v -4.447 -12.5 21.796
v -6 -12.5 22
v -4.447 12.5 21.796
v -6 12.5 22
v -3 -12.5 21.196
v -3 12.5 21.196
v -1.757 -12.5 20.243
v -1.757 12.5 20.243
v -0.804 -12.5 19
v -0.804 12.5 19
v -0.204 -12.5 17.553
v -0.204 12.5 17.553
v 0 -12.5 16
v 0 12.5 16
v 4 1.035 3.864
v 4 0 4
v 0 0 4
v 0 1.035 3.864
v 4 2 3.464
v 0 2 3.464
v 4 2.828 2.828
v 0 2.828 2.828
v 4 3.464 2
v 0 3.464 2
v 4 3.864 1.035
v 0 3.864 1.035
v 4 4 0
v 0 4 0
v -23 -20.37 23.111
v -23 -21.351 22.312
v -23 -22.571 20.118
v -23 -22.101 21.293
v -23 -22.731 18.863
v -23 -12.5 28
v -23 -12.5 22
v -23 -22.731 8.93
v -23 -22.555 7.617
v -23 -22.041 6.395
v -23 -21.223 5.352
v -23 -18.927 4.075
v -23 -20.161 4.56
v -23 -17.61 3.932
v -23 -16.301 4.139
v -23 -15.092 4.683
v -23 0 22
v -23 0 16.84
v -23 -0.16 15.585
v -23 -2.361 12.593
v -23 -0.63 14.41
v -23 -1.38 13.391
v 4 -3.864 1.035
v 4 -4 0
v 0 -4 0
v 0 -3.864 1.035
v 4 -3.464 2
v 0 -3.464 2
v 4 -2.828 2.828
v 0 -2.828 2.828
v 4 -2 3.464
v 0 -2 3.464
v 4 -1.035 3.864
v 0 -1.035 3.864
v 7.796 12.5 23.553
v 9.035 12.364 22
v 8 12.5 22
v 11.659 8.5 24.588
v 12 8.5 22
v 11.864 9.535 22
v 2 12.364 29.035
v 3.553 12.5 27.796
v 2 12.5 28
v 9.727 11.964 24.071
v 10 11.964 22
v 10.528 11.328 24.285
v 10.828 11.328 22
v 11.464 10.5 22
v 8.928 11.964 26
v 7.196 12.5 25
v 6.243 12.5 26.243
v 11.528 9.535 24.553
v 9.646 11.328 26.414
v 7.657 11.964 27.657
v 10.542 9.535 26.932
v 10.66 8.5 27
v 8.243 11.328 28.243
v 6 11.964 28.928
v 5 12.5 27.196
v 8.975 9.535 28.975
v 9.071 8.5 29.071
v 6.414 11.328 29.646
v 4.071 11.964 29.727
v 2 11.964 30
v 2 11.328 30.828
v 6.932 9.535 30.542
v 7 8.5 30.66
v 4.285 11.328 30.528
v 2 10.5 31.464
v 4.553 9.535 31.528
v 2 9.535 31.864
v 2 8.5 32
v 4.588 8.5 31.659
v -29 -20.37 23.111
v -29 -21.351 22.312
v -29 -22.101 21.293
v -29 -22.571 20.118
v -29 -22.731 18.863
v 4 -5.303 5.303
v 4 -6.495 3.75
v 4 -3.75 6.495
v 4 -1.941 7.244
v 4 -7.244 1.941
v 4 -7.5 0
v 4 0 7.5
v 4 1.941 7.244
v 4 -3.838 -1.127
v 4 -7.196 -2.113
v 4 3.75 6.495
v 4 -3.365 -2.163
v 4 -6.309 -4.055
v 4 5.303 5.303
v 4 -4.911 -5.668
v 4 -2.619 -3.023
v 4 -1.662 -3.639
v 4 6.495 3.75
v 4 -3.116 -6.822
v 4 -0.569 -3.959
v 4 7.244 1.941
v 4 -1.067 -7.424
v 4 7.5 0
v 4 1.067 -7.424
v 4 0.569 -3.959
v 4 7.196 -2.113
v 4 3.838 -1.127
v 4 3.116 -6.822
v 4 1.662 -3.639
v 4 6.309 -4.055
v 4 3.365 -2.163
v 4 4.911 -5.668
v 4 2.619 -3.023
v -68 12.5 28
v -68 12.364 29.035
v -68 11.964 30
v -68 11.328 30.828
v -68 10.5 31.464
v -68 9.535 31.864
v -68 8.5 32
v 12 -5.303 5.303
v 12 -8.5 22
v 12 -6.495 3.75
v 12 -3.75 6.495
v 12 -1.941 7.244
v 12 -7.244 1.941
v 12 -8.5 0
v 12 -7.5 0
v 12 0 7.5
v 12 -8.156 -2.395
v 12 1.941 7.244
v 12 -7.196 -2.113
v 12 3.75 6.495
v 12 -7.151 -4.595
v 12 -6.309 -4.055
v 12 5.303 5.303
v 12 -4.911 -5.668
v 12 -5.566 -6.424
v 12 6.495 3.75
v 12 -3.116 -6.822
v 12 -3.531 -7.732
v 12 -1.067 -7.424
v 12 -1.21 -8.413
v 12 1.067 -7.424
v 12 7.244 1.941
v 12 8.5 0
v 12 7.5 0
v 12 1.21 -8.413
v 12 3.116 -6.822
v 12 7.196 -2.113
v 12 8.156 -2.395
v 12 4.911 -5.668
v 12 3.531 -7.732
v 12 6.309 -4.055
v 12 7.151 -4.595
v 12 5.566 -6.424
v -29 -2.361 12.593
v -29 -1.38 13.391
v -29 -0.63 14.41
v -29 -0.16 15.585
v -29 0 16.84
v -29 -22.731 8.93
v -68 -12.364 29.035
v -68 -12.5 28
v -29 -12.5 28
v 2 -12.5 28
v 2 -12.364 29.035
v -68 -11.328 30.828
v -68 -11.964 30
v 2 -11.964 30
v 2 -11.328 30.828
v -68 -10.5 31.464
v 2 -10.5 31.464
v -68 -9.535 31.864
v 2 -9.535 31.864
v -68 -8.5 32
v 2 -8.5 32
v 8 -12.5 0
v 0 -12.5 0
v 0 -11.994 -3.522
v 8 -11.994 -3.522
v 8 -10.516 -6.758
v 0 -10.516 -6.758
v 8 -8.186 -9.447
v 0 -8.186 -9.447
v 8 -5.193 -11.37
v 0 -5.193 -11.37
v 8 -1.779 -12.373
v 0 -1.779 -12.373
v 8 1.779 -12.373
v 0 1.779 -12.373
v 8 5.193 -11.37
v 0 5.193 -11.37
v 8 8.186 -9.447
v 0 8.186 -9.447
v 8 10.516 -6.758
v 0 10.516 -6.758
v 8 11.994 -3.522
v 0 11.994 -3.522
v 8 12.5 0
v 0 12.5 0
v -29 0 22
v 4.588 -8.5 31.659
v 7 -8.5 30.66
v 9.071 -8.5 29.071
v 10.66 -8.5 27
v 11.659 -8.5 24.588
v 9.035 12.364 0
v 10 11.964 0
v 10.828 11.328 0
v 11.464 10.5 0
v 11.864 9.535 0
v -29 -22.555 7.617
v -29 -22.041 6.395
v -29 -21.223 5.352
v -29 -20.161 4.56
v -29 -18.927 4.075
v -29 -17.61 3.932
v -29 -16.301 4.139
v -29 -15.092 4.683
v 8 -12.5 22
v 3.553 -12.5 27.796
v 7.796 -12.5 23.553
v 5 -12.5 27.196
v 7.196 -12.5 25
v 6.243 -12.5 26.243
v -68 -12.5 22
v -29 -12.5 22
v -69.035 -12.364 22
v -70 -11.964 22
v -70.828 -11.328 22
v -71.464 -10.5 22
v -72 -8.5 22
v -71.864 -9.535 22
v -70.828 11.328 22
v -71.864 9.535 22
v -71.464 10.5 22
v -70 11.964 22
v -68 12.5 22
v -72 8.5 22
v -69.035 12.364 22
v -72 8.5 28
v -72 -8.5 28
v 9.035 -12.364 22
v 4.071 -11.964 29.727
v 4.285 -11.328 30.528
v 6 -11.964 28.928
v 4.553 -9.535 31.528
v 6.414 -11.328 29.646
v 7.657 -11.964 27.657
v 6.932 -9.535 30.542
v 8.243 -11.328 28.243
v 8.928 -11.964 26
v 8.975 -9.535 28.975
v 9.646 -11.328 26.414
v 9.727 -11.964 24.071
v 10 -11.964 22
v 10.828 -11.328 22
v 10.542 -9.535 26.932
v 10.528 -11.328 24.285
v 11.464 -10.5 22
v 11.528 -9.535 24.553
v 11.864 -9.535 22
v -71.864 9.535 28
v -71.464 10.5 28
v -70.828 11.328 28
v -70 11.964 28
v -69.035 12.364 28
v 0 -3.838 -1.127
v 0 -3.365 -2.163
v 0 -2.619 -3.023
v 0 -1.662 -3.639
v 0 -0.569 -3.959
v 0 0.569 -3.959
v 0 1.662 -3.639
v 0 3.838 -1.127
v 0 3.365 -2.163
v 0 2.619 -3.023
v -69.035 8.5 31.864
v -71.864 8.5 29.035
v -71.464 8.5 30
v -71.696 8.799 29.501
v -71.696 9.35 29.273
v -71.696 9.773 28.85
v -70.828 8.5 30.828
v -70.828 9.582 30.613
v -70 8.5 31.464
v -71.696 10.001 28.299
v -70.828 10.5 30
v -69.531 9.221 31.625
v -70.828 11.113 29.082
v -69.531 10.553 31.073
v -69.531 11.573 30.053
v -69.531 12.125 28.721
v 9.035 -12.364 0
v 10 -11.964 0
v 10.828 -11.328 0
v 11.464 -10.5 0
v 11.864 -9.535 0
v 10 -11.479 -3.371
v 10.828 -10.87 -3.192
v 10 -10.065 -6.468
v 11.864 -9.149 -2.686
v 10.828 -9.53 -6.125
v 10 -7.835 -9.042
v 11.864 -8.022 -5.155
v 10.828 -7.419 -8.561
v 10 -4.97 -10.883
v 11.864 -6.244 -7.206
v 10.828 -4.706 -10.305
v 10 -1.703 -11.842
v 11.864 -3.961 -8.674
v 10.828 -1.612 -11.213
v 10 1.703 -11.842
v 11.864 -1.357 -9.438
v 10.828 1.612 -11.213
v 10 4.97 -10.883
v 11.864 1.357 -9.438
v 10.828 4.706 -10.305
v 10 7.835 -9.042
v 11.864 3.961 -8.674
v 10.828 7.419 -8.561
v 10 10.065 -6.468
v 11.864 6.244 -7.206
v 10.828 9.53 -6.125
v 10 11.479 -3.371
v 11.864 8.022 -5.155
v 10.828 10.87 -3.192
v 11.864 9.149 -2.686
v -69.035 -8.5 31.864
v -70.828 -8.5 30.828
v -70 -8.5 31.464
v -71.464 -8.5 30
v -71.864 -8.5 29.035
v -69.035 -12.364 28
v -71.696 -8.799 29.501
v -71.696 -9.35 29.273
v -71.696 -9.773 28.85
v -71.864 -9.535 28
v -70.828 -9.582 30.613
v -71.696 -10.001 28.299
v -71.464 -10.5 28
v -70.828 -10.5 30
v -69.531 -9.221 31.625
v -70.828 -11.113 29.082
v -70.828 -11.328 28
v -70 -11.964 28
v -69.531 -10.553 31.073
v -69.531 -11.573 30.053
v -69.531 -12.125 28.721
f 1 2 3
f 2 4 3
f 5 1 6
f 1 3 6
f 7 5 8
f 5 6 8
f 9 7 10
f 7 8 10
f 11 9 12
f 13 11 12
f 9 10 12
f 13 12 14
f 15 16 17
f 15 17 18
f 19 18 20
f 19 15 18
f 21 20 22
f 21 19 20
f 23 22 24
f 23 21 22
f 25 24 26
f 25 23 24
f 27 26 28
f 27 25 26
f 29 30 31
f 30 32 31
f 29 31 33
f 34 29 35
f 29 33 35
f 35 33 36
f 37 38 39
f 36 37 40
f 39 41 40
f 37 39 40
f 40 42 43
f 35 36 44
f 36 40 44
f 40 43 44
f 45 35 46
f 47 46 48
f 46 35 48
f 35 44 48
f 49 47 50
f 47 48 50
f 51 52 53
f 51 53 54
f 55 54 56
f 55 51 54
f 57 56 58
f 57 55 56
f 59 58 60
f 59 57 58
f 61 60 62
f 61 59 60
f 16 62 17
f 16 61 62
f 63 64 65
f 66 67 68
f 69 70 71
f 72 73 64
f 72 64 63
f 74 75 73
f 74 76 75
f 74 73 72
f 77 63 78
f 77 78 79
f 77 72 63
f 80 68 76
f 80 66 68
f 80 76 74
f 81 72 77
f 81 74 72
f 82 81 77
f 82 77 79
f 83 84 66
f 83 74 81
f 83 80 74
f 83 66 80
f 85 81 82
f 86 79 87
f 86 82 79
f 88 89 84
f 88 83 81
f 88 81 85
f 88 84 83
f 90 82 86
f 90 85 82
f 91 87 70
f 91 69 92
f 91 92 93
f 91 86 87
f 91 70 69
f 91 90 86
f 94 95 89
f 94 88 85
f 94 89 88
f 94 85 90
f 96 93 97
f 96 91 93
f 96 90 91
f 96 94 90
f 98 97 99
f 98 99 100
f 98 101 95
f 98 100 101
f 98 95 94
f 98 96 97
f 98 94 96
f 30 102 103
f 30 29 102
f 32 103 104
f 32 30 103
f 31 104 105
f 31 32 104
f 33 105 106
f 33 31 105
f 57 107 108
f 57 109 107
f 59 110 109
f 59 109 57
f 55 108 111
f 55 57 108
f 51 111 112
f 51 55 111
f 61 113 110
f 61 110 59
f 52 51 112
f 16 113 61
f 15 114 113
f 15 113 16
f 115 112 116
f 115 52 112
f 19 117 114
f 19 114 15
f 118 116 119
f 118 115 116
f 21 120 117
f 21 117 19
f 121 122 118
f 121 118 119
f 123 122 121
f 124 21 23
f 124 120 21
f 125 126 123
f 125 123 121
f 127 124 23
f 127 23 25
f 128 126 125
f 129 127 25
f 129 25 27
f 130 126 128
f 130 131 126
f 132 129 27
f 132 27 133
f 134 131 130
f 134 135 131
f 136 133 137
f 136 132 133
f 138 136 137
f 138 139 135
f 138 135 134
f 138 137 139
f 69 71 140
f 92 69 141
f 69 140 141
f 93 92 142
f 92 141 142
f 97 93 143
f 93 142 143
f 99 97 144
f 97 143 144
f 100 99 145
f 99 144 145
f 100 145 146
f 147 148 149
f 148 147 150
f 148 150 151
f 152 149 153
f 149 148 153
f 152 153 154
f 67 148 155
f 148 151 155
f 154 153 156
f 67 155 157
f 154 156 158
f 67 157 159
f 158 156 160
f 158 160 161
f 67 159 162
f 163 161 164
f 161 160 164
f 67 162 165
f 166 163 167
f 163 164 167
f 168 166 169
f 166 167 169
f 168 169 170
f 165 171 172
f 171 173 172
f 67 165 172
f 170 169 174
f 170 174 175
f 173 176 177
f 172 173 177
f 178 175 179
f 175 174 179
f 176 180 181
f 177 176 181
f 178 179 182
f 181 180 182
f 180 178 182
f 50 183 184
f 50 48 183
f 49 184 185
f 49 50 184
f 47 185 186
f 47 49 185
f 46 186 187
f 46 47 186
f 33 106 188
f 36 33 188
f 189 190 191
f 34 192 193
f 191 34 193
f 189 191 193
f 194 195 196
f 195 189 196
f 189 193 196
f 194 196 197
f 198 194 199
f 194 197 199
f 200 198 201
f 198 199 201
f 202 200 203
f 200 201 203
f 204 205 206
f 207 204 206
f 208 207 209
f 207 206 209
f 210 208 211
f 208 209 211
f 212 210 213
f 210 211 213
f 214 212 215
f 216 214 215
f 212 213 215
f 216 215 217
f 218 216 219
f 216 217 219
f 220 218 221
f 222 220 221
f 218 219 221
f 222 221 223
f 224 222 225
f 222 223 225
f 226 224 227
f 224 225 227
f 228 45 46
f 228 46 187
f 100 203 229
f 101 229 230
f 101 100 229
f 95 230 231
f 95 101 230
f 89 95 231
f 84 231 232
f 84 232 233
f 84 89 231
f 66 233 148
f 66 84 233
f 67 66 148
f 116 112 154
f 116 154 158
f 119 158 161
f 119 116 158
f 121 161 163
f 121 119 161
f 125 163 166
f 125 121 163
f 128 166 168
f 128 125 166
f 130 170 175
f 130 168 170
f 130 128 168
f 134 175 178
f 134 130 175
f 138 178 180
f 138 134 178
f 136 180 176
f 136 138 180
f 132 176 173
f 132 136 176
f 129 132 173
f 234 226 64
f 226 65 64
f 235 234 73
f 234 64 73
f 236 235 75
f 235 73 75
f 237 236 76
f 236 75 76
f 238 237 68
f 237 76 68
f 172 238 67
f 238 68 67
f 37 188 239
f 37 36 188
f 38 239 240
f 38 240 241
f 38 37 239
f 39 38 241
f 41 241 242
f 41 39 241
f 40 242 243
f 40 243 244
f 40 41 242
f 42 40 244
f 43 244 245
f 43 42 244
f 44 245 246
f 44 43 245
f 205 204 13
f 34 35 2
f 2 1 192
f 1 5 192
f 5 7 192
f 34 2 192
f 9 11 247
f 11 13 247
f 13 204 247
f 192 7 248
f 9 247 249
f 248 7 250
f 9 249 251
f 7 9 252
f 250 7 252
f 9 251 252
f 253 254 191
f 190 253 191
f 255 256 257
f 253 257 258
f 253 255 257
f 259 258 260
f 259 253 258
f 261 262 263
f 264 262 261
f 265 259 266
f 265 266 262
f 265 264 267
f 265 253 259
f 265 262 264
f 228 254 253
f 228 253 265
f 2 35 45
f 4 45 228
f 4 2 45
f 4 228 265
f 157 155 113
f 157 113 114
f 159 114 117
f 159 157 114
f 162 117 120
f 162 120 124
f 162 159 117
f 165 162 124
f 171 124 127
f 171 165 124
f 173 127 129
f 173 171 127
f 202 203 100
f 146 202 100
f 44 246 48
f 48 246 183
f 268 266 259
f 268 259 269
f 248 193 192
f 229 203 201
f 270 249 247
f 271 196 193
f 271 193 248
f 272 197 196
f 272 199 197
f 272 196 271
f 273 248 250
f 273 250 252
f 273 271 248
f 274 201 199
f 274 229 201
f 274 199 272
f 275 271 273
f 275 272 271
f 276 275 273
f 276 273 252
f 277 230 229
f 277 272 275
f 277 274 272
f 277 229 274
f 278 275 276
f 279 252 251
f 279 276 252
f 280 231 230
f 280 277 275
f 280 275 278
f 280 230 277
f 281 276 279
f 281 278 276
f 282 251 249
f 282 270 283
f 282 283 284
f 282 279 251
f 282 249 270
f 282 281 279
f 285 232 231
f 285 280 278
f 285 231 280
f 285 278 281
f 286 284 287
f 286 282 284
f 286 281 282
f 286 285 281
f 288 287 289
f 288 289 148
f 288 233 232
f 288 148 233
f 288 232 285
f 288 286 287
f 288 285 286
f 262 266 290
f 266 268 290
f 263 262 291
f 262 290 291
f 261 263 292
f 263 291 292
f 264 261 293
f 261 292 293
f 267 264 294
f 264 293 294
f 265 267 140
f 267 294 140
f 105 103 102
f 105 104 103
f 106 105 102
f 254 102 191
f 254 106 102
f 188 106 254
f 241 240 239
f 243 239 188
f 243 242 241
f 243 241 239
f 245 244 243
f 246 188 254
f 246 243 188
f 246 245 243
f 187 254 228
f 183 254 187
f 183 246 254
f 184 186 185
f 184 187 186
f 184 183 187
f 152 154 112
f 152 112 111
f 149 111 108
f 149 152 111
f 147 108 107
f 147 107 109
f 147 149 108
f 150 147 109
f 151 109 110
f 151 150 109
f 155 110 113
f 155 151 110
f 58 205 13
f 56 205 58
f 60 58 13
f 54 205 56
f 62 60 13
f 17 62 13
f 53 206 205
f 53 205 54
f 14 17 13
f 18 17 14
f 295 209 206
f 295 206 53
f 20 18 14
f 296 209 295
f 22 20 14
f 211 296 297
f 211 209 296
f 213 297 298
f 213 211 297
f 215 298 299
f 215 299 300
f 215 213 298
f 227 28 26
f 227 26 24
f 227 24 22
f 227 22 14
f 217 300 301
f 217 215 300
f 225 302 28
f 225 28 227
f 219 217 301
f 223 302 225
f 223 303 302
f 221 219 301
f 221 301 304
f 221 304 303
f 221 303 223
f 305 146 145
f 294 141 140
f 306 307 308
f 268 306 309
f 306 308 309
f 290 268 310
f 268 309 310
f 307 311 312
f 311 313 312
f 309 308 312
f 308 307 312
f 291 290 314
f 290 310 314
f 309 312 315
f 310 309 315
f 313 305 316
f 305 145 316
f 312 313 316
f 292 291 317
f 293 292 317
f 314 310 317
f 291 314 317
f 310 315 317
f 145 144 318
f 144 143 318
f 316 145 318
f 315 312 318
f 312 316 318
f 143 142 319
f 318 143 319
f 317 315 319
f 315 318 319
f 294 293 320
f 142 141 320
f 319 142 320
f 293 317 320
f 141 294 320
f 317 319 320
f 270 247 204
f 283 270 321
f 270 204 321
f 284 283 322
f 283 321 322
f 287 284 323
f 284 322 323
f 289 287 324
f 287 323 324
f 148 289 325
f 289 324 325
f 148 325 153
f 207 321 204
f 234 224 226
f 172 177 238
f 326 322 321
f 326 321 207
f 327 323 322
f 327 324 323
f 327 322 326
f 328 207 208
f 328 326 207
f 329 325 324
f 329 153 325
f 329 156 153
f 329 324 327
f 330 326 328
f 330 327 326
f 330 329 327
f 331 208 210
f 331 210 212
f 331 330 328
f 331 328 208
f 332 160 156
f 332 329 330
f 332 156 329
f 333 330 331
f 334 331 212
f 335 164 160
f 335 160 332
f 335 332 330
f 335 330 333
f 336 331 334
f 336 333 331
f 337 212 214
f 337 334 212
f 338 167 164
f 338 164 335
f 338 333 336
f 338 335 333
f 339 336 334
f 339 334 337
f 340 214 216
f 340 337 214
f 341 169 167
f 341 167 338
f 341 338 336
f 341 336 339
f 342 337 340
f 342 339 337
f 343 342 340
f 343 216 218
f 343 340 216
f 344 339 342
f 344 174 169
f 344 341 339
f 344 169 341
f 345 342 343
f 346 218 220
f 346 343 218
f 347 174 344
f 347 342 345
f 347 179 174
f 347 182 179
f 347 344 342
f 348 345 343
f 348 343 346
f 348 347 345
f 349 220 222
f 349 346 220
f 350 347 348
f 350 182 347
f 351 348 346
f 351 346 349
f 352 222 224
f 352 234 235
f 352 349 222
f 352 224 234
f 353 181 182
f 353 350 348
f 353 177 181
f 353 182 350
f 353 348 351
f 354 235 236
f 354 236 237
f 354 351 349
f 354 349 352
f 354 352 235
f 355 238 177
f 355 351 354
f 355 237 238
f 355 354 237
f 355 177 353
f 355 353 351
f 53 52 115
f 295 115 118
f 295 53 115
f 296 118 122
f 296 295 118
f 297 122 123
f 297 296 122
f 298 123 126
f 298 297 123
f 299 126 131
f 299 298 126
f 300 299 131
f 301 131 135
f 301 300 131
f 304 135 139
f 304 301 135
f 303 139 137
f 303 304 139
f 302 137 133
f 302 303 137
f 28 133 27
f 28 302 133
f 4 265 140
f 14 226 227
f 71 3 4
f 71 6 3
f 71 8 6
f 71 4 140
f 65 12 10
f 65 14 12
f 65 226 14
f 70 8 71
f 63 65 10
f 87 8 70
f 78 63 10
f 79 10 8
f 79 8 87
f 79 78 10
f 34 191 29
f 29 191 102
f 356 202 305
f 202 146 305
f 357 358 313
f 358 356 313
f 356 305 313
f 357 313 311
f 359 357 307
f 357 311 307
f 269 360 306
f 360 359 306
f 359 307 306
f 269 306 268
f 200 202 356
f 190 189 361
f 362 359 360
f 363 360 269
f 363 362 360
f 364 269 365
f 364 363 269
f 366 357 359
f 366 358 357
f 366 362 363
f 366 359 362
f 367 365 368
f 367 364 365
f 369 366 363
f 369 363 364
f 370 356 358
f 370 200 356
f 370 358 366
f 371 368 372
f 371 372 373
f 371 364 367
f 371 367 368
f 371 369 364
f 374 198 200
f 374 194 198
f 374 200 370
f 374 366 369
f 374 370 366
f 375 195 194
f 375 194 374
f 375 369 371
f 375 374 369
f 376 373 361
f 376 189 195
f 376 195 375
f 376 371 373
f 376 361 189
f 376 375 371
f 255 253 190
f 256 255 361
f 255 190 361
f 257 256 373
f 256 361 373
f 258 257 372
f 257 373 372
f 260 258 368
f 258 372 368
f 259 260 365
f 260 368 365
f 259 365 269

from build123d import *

# Parameters (mm, degrees)
SKETCH1_R           = 12.5
SKETCH1_R_2         = 7.5
BOSS_EXTRUDE1_DEPTH = 12
SKETCH1_3_R         = 7.5
SKETCH1_3_R_2       = 4
BOSS_EXTRUDE2_DEPTH = 4
SKETCH2_W           = 12
SKETCH2_H           = 25
BOSS_EXTRUDE3_DEPTH = 32
CUT_EXTRUDE1_DEPTH  = 8
CUT_EXTRUDE2_DEPTH  = 13
SKETCH4_W           = 10
SKETCH4_H           = 25
BOSS_EXTRUDE4_DEPTH = 72
FILLET1_R           = 6
FILLET2_R           = 10
FILLET3_R           = 4
SKETCH5_W           = 6
SKETCH5_H           = 30.078064569
BOSS_EXTRUDE5_DEPTH = 35
CUT_EXTRUDE3_REACH  = 43
SKETCH7_W           = 6
SKETCH7_H           = 17.578064569
BOSS_EXTRUDE6_DEPTH = 6
CUT_EXTRUDE4_REACH  = 43
FILLET4_R           = 5


with BuildPart() as part:
    # Sketch1 → Boss-Extrude1 (new body)
    with BuildSketch(Plane(origin=(0, 0, 0), x_dir=(0, 0, -1), z_dir=(1, 0, 0))):
        Circle(SKETCH1_R)
        Circle(SKETCH1_R_2, mode=Mode.SUBTRACT)
    extrude(amount=BOSS_EXTRUDE1_DEPTH)

    # Sketch1<3> → Boss-Extrude2 (add)
    with BuildSketch(Plane(origin=(0, 0, 0), x_dir=(0, 0, -1), z_dir=(1, 0, 0))):
        Circle(SKETCH1_3_R)
        Circle(SKETCH1_3_R_2, mode=Mode.SUBTRACT)
    extrude(amount=BOSS_EXTRUDE2_DEPTH)

    # Sketch2 → Boss-Extrude3 (add)
    with BuildSketch(Plane.XY):
        with Locations((6, 0)):
            Rectangle(SKETCH2_W, SKETCH2_H)
    extrude(amount=BOSS_EXTRUDE3_DEPTH)

    # Sketch3 → Cut-Extrude1 (cut)
    with BuildSketch(Plane(origin=(12, 0, -12), x_dir=(0, 0, 1), z_dir=(-1, 0, 0))):
        with BuildLine():
            ThreePointArc((12, 4), (14.828427125, 2.828427125), (16, 0))
            ThreePointArc((16, 0), (14.828427125, -2.828427125), (12, -4))
            Line((12, -4), (12, -7.5))
            ThreePointArc((12, -7.5), (17.303300859, -5.303300859), (19.5, 0))
            ThreePointArc((19.5, 0), (17.303300859, 5.303300859), (12, 7.5))
            Line((12, 7.5), (12, 4))
        make_face()
        with BuildLine():
            ThreePointArc((12, -4), (8, 0), (12, 4))
            Line((12, 4), (12, 7.5))
            ThreePointArc((12, 7.5), (4.5, 0), (12, -7.5))
            Line((12, -7.5), (12, -4))
        make_face()
    extrude(amount=CUT_EXTRUDE1_DEPTH, mode=Mode.SUBTRACT)

    # Sketch3<6> → Cut-Extrude2 (cut, through all)
    with BuildSketch(Plane(origin=(12, 0, -12), x_dir=(0, 0, 1), z_dir=(-1, 0, 0))):
        with BuildLine():
            ThreePointArc((12, -4), (14.828427125, -2.828427125), (16, 0))
            ThreePointArc((16, 0), (14.828427125, 2.828427125), (12, 4))
            Line((12, 4), (12, -4))
        make_face()
        with BuildLine():
            Line((12, -4), (12, 4))
            ThreePointArc((12, 4), (8, 0), (12, -4))
        make_face()
    extrude(amount=CUT_EXTRUDE2_DEPTH, mode=Mode.SUBTRACT)

    # Sketch4 → Boss-Extrude4 (add)
    with BuildSketch(Plane.ZY):
        with Locations((27, 0)):
            Rectangle(SKETCH4_W, SKETCH4_H)
    extrude(amount=BOSS_EXTRUDE4_DEPTH)

    # Fillet1
    fillet1_edges = [part.edges().sort_by_distance(p)[0] for p in [
        (0, 0, 22),
    ]]
    fillet(fillet1_edges, radius=FILLET1_R)

    # Fillet2
    fillet2_edges = [part.edges().sort_by_distance(p)[0] for p in [
        (12, 0, 32),
    ]]
    fillet(fillet2_edges, radius=FILLET2_R)

    # Fillet3
    fillet3_edges = [part.edges().sort_by_distance(p)[0] for p in [
        (9.071067812, -12.5, 29.071067812),
        (12, 0, -12.5),
        (-36, -12.5, 32),
        (-72, 0, 32),
        (-72, 12.5, 27),
        (-72, -12.5, 27),
        (-36, 12.5, 32),
        (12, 12.5, 11),
        (9.071067812, 12.5, 29.071067812),
        (12, -12.5, 11),
    ]]
    fillet(fillet3_edges, radius=FILLET3_R)

    # Sketch5 → Boss-Extrude5 (add)
    with BuildSketch(Plane(origin=(0, 0, 22), x_dir=(-1, 0, 0), z_dir=(0, 0, -1))):
        with Locations((26, -15.039032285)):
            Rectangle(SKETCH5_W, SKETCH5_H)
    extrude(amount=BOSS_EXTRUDE5_DEPTH)

    # Sketch6 → Cut-Extrude3 (cut, up to next)
    with BuildSketch(Plane.ZY.offset(29), mode=Mode.PRIVATE) as cut_extrude3_sk1:
        Polygon((-4.627390911, -30.078064569), (14.060102478, 0), (-13, 0), (-13, -30.078064569), align=None)
    cut_extrude3_tool1 = extrude(cut_extrude3_sk1.sketch, amount=-CUT_EXTRUDE3_REACH, mode=Mode.PRIVATE) & part.part
    add(cut_extrude3_tool1.solids().sort_by_distance((-29, -12.395131, -3.320494))[0], mode=Mode.SUBTRACT)

    # Sketch7 → Boss-Extrude6 (add)
    with BuildSketch(Plane.XY.offset(22)):
        with Locations((-26, -21.289032285)):
            Rectangle(SKETCH7_W, SKETCH7_H)
    extrude(amount=BOSS_EXTRUDE6_DEPTH)

    # Sketch8 → Cut-Extrude4 (cut, up to next)
    with BuildSketch(Plane.ZY.offset(29), mode=Mode.PRIVATE) as cut_extrude4_sk1:
        Polygon((28, -12.5), (21.643434009, -22.731077991), (-0.062710135, -22.731077991), (-4.627390911, -30.078064569), (28, -30.078064569), align=None)
    cut_extrude4_tool1 = extrude(cut_extrude4_sk1.sketch, amount=-CUT_EXTRUDE4_REACH, mode=Mode.PRIVATE) & part.part
    add(cut_extrude4_tool1.solids().sort_by_distance((-29, -25.583256, 14.464083))[0], mode=Mode.SUBTRACT)

    # Fillet4
    fillet4_edges = [part.edges().sort_by_distance(p)[0] for p in [
        (-26, 0, 14.060102478),
        (-26, -22.731077991, -0.062710135),
        (-26, -22.731077991, 21.643434009),
    ]]
    fillet(fillet4_edges, radius=FILLET4_R)


solid = part.part
